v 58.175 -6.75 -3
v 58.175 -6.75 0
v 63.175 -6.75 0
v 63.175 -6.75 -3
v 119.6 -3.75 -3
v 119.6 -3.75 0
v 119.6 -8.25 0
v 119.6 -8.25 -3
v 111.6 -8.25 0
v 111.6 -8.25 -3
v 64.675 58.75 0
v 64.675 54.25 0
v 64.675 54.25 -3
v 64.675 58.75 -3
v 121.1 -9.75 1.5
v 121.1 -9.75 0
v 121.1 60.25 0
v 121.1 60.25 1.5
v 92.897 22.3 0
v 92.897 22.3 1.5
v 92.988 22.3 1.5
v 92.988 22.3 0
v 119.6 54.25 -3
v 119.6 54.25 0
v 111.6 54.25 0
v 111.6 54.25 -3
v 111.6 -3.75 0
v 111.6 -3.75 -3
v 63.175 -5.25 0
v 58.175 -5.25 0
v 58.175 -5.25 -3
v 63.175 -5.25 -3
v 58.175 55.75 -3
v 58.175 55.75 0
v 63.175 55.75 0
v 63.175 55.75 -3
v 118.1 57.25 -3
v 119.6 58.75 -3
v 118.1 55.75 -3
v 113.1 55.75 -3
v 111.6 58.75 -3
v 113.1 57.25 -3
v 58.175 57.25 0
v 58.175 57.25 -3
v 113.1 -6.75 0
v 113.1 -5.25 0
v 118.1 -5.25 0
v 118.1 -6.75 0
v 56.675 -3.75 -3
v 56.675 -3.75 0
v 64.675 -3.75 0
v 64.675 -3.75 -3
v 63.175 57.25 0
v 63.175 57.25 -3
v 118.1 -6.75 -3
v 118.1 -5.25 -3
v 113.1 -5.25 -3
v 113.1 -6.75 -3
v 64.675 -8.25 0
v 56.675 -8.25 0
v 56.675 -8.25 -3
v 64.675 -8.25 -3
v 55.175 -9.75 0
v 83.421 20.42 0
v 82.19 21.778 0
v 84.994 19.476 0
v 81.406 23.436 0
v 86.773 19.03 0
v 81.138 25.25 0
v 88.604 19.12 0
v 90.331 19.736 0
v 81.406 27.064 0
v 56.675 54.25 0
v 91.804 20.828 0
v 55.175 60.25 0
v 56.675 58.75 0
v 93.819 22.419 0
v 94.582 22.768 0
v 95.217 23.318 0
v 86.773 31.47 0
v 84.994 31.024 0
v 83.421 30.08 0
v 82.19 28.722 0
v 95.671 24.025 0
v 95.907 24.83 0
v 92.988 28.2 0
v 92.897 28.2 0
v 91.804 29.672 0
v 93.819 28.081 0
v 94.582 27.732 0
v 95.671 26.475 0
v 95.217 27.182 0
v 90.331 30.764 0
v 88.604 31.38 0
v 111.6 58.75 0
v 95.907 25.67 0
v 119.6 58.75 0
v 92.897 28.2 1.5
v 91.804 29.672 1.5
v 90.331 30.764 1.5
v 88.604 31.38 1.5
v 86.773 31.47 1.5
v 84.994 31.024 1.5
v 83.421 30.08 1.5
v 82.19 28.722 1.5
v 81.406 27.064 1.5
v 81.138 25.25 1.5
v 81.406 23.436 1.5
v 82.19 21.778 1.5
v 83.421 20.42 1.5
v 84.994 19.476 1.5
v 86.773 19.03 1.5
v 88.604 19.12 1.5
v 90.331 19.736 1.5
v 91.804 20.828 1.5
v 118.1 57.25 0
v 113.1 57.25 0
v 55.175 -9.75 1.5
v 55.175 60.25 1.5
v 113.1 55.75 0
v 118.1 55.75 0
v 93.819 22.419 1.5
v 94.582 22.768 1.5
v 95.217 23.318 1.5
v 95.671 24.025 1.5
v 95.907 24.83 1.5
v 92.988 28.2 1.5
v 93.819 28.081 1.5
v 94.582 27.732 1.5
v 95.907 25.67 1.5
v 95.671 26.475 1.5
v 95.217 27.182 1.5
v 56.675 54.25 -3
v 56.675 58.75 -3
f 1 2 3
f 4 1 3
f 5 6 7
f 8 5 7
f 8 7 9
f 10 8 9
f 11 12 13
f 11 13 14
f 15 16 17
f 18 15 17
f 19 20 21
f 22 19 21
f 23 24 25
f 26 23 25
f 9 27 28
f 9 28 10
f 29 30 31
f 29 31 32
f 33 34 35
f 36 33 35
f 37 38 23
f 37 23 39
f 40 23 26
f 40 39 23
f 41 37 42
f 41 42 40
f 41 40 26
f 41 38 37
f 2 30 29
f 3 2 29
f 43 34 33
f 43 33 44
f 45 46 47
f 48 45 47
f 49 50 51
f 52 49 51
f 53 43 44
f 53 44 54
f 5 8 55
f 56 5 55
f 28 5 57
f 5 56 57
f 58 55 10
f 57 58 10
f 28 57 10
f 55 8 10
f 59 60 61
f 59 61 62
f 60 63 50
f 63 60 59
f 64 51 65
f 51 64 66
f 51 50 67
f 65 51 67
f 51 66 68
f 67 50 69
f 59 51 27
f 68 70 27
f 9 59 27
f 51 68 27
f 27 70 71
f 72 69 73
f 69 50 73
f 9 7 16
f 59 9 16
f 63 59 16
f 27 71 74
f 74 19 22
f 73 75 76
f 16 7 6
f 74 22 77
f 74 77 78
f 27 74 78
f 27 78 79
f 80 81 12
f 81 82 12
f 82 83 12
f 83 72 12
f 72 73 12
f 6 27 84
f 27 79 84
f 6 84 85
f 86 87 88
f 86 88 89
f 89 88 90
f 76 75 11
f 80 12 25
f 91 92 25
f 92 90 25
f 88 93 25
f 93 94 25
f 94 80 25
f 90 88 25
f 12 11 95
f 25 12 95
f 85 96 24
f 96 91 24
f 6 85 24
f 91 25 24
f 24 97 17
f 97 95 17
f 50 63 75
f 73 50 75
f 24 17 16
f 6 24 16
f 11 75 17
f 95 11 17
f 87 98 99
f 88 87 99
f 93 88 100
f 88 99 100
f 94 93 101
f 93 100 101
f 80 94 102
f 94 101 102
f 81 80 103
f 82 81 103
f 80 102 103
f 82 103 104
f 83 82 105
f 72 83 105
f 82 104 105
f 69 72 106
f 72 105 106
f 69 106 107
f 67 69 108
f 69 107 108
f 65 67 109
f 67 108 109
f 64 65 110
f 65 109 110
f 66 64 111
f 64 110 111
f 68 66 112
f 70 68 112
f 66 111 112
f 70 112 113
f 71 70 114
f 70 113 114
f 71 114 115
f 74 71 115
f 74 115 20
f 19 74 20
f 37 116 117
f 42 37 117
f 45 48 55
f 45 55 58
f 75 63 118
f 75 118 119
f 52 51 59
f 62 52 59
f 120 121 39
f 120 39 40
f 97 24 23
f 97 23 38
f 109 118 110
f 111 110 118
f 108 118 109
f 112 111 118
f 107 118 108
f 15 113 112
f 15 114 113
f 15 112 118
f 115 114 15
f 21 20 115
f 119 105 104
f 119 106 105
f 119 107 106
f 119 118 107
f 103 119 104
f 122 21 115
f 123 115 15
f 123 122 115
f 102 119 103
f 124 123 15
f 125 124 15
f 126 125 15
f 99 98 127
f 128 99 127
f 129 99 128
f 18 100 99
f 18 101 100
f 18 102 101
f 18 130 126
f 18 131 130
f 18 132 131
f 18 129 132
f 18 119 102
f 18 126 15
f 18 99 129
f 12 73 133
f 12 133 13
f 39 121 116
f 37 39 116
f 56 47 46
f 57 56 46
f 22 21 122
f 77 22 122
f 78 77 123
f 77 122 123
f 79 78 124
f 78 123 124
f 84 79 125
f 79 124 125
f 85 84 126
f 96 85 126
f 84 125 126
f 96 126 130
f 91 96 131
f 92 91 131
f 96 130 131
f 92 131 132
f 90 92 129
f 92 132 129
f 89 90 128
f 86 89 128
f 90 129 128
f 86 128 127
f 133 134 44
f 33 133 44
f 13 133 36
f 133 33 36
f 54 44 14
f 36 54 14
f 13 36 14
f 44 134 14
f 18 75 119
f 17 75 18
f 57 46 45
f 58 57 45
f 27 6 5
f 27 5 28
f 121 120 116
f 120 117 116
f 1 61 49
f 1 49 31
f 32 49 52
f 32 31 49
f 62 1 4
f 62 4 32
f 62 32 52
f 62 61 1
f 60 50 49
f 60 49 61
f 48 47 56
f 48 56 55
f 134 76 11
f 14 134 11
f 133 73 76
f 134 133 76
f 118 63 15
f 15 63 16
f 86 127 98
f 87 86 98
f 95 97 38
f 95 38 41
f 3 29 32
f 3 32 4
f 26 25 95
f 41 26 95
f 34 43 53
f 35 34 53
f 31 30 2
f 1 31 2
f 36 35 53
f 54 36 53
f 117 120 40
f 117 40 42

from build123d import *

# Parameters (mm, degrees)
SKETCH1_W                 = 65.925
SKETCH1_H                 = 70
BOSS_EXTRUDE1_DEPTH       = 1.5
CUT_EXTRUDE1_REACH        = 137.268
SKETCH4_W                 = 8
SKETCH4_H                 = 4.5
SKETCH4_W_2               = 5
SKETCH4_H_2               = 1.5
BOSS_EXTRUDE2_DEPTH       = 3
MIRROR2_COPY_1_SKETCH_W   = 8
MIRROR2_COPY_1_SKETCH_H   = 4.5
MIRROR2_COPY_1_SKETCH_W_2 = 5
MIRROR2_COPY_1_SKETCH_H_2 = 1.5
MIRROR2_COPY_1_DEPTH      = 3


with BuildPart() as part:
    # Sketch1 → Boss-Extrude1 (new body)
    with BuildSketch(Plane.XY):
        with Locations((88.1375, 25.25)):
            Rectangle(SKETCH1_W, SKETCH1_H)
    extrude(amount=BOSS_EXTRUDE1_DEPTH)

    # Sketch2 → Cut-Extrude1 (cut, up to next)
    with BuildSketch(Plane.XY.offset(1.5), mode=Mode.PRIVATE) as cut_extrude1_sk1:
        with BuildLine():
            Line((92.897490926, 22.3), (92.9875, 22.3))
            ThreePointArc((92.9875, 22.3), (95.9375, 25.25), (92.9875, 28.2))
            Line((92.9875, 28.2), (92.897490926, 28.2))
            ThreePointArc((92.897490926, 28.2), (81.1375, 25.25), (92.897490926, 22.3))
        make_face()
    cut_extrude1_tool1 = extrude(cut_extrude1_sk1.sketch, amount=-CUT_EXTRUDE1_REACH, mode=Mode.PRIVATE) & part.part
    add(cut_extrude1_tool1.solids().sort_by_distance((87.980915, 25.25, 1.5))[0], mode=Mode.SUBTRACT)

    # Sketch4 → Boss-Extrude2 (add)
    with BuildSketch(Plane(origin=(0, 0, 0), x_dir=(-1, 0, 0), z_dir=(0, 0, -1))):
        with Locations((-115.6, 56.5)):
            Rectangle(SKETCH4_W, SKETCH4_H)
        with Locations((-115.6, 56.5)):
            Rectangle(SKETCH4_W_2, SKETCH4_H_2, mode=Mode.SUBTRACT)
    boss_extrude2 = extrude(amount=BOSS_EXTRUDE2_DEPTH)

    # Mirror1: Boss-Extrude2 across plane
    add(boss_extrude2.mirror(Plane(origin=(88.1375, 0, 0), x_dir=(0, 0, 1), z_dir=(1, 0, 0))))

    # Mirror2: Boss-Extrude2 across plane
    add(boss_extrude2.mirror(Plane.ZX.offset(25.25)))

    # Mirror2 copy 1 sketch → Mirror2 copy 1 (add)
    with BuildSketch(Plane(origin=(176.275, 50.5, 0), x_dir=(1, 0, 0), z_dir=(0, 0, -1))):
        with Locations((-115.6, 56.5)):
            Rectangle(MIRROR2_COPY_1_SKETCH_W, MIRROR2_COPY_1_SKETCH_H)
        with Locations((-115.6, 56.5)):
            Rectangle(MIRROR2_COPY_1_SKETCH_W_2, MIRROR2_COPY_1_SKETCH_H_2, mode=Mode.SUBTRACT)
    extrude(amount=MIRROR2_COPY_1_DEPTH)


solid = part.part
